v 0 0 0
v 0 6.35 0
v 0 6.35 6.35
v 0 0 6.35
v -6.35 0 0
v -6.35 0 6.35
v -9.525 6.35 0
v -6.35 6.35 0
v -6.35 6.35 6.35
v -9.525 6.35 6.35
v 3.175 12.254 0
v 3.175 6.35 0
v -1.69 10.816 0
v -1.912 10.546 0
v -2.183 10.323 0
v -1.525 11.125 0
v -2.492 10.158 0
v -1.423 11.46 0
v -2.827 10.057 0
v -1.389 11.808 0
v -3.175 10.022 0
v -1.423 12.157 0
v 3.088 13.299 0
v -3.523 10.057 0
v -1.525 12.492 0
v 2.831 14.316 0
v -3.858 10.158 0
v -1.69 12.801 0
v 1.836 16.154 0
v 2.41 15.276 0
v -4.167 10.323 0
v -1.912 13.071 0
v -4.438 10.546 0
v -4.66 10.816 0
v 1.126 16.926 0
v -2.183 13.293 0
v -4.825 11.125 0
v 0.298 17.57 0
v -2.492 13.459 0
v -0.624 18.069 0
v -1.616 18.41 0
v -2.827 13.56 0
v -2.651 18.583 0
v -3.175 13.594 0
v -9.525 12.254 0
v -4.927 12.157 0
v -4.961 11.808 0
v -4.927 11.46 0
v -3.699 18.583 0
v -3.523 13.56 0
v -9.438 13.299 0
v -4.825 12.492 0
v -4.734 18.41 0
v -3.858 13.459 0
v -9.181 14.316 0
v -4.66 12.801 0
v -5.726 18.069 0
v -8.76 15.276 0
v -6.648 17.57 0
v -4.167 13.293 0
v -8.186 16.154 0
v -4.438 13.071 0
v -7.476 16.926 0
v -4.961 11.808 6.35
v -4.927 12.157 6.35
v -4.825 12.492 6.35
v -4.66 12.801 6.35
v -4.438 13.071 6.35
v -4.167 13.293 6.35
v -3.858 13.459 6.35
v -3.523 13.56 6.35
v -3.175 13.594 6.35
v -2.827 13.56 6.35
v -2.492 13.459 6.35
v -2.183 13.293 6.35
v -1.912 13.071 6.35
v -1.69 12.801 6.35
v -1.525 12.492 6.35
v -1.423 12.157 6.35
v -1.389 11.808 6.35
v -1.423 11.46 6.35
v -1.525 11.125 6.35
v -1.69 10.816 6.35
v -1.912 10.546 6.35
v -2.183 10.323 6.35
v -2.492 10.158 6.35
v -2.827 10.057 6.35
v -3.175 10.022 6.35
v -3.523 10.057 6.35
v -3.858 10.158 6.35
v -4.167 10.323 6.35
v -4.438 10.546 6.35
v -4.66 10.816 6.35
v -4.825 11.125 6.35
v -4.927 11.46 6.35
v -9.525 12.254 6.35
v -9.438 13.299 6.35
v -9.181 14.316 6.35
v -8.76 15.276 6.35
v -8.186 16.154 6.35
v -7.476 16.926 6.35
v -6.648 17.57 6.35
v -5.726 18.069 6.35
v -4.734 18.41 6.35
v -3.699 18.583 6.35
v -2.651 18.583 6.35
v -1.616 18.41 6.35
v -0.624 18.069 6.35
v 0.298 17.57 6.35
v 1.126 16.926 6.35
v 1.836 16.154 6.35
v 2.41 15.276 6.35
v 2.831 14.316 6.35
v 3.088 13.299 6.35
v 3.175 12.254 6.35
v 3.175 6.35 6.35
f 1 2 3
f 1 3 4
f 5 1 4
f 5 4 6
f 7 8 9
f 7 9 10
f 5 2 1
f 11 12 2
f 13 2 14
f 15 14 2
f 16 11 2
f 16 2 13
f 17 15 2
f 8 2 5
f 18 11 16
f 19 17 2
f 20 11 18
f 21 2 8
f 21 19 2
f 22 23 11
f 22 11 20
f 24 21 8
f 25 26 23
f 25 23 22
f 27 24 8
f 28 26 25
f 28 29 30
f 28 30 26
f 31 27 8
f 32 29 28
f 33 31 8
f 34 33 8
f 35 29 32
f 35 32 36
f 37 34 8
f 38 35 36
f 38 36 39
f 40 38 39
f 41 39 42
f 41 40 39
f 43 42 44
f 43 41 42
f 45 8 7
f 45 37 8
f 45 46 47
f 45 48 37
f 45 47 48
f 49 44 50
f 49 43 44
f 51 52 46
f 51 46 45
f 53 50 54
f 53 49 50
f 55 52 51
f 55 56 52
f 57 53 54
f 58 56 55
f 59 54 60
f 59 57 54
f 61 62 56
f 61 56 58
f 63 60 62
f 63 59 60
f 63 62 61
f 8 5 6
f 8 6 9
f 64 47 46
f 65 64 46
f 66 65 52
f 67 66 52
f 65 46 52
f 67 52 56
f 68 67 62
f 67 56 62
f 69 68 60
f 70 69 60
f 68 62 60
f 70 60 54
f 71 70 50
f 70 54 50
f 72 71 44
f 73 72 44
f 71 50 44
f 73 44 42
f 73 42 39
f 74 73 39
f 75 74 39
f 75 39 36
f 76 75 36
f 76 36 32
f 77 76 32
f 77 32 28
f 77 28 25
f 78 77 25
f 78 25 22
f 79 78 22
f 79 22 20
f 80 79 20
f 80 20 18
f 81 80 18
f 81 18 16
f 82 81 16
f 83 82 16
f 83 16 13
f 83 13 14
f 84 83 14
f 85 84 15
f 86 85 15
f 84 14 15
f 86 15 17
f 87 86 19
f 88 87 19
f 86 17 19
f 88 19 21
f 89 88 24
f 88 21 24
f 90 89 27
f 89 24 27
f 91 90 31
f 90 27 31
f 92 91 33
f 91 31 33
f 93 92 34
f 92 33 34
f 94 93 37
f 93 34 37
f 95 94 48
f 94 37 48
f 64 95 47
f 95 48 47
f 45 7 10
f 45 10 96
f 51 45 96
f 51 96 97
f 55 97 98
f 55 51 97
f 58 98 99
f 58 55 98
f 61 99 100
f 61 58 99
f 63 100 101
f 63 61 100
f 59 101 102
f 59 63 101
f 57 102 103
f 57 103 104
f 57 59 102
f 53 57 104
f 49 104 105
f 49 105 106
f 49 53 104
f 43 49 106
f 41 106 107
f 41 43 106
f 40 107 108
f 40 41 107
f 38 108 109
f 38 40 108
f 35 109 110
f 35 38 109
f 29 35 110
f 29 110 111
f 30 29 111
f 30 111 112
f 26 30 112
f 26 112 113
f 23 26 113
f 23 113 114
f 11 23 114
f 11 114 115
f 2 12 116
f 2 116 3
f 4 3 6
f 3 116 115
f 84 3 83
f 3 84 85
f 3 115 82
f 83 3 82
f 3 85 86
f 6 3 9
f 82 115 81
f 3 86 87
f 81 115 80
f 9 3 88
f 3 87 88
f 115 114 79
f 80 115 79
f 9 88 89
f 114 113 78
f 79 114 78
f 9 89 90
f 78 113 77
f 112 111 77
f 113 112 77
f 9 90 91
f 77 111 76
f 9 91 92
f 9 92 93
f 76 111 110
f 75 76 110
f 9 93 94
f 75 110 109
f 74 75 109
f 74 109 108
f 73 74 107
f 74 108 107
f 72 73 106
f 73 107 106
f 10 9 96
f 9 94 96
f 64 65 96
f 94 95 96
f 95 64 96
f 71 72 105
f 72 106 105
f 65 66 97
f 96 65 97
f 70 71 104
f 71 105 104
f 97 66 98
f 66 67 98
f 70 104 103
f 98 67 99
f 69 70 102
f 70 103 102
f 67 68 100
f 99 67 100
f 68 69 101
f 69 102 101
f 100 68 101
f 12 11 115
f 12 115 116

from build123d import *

# Parameters (mm, degrees)
BOSS_EXTRUDE1_DEPTH             = 6.35
F_9_64_0_14063_DIAMETER_HOLE1_D = 3.572002


with BuildPart() as part:
    # Sketch1 → Boss-Extrude1 (new body)
    with BuildSketch(Plane.XY):
        with BuildLine():
            Line((-6.35, 6.35), (-9.525, 6.35))
            Line((-9.525, 6.35), (-9.525, 12.25423))
            ThreePointArc((-9.525, 12.25423), (-3.175, 18.60423), (3.175, 12.25423))
            Line((3.175, 12.25423), (3.175, 6.35))
            Line((3.175, 6.35), (0, 6.35))
            Line((0, 6.35), (0, 0))
            Line((0, 0), (-6.35, 0))
            Line((-6.35, 0), (-6.35, 6.35))
        make_face()
    extrude(amount=BOSS_EXTRUDE1_DEPTH)

    # 9/64 (0.14063) Diameter Hole1 (through all)
    with Locations(Plane.XY.offset(6.35)):
        with Locations((-3.175, 11.80846)):
            Hole(F_9_64_0_14063_DIAMETER_HOLE1_D / 2)


solid = part.part
